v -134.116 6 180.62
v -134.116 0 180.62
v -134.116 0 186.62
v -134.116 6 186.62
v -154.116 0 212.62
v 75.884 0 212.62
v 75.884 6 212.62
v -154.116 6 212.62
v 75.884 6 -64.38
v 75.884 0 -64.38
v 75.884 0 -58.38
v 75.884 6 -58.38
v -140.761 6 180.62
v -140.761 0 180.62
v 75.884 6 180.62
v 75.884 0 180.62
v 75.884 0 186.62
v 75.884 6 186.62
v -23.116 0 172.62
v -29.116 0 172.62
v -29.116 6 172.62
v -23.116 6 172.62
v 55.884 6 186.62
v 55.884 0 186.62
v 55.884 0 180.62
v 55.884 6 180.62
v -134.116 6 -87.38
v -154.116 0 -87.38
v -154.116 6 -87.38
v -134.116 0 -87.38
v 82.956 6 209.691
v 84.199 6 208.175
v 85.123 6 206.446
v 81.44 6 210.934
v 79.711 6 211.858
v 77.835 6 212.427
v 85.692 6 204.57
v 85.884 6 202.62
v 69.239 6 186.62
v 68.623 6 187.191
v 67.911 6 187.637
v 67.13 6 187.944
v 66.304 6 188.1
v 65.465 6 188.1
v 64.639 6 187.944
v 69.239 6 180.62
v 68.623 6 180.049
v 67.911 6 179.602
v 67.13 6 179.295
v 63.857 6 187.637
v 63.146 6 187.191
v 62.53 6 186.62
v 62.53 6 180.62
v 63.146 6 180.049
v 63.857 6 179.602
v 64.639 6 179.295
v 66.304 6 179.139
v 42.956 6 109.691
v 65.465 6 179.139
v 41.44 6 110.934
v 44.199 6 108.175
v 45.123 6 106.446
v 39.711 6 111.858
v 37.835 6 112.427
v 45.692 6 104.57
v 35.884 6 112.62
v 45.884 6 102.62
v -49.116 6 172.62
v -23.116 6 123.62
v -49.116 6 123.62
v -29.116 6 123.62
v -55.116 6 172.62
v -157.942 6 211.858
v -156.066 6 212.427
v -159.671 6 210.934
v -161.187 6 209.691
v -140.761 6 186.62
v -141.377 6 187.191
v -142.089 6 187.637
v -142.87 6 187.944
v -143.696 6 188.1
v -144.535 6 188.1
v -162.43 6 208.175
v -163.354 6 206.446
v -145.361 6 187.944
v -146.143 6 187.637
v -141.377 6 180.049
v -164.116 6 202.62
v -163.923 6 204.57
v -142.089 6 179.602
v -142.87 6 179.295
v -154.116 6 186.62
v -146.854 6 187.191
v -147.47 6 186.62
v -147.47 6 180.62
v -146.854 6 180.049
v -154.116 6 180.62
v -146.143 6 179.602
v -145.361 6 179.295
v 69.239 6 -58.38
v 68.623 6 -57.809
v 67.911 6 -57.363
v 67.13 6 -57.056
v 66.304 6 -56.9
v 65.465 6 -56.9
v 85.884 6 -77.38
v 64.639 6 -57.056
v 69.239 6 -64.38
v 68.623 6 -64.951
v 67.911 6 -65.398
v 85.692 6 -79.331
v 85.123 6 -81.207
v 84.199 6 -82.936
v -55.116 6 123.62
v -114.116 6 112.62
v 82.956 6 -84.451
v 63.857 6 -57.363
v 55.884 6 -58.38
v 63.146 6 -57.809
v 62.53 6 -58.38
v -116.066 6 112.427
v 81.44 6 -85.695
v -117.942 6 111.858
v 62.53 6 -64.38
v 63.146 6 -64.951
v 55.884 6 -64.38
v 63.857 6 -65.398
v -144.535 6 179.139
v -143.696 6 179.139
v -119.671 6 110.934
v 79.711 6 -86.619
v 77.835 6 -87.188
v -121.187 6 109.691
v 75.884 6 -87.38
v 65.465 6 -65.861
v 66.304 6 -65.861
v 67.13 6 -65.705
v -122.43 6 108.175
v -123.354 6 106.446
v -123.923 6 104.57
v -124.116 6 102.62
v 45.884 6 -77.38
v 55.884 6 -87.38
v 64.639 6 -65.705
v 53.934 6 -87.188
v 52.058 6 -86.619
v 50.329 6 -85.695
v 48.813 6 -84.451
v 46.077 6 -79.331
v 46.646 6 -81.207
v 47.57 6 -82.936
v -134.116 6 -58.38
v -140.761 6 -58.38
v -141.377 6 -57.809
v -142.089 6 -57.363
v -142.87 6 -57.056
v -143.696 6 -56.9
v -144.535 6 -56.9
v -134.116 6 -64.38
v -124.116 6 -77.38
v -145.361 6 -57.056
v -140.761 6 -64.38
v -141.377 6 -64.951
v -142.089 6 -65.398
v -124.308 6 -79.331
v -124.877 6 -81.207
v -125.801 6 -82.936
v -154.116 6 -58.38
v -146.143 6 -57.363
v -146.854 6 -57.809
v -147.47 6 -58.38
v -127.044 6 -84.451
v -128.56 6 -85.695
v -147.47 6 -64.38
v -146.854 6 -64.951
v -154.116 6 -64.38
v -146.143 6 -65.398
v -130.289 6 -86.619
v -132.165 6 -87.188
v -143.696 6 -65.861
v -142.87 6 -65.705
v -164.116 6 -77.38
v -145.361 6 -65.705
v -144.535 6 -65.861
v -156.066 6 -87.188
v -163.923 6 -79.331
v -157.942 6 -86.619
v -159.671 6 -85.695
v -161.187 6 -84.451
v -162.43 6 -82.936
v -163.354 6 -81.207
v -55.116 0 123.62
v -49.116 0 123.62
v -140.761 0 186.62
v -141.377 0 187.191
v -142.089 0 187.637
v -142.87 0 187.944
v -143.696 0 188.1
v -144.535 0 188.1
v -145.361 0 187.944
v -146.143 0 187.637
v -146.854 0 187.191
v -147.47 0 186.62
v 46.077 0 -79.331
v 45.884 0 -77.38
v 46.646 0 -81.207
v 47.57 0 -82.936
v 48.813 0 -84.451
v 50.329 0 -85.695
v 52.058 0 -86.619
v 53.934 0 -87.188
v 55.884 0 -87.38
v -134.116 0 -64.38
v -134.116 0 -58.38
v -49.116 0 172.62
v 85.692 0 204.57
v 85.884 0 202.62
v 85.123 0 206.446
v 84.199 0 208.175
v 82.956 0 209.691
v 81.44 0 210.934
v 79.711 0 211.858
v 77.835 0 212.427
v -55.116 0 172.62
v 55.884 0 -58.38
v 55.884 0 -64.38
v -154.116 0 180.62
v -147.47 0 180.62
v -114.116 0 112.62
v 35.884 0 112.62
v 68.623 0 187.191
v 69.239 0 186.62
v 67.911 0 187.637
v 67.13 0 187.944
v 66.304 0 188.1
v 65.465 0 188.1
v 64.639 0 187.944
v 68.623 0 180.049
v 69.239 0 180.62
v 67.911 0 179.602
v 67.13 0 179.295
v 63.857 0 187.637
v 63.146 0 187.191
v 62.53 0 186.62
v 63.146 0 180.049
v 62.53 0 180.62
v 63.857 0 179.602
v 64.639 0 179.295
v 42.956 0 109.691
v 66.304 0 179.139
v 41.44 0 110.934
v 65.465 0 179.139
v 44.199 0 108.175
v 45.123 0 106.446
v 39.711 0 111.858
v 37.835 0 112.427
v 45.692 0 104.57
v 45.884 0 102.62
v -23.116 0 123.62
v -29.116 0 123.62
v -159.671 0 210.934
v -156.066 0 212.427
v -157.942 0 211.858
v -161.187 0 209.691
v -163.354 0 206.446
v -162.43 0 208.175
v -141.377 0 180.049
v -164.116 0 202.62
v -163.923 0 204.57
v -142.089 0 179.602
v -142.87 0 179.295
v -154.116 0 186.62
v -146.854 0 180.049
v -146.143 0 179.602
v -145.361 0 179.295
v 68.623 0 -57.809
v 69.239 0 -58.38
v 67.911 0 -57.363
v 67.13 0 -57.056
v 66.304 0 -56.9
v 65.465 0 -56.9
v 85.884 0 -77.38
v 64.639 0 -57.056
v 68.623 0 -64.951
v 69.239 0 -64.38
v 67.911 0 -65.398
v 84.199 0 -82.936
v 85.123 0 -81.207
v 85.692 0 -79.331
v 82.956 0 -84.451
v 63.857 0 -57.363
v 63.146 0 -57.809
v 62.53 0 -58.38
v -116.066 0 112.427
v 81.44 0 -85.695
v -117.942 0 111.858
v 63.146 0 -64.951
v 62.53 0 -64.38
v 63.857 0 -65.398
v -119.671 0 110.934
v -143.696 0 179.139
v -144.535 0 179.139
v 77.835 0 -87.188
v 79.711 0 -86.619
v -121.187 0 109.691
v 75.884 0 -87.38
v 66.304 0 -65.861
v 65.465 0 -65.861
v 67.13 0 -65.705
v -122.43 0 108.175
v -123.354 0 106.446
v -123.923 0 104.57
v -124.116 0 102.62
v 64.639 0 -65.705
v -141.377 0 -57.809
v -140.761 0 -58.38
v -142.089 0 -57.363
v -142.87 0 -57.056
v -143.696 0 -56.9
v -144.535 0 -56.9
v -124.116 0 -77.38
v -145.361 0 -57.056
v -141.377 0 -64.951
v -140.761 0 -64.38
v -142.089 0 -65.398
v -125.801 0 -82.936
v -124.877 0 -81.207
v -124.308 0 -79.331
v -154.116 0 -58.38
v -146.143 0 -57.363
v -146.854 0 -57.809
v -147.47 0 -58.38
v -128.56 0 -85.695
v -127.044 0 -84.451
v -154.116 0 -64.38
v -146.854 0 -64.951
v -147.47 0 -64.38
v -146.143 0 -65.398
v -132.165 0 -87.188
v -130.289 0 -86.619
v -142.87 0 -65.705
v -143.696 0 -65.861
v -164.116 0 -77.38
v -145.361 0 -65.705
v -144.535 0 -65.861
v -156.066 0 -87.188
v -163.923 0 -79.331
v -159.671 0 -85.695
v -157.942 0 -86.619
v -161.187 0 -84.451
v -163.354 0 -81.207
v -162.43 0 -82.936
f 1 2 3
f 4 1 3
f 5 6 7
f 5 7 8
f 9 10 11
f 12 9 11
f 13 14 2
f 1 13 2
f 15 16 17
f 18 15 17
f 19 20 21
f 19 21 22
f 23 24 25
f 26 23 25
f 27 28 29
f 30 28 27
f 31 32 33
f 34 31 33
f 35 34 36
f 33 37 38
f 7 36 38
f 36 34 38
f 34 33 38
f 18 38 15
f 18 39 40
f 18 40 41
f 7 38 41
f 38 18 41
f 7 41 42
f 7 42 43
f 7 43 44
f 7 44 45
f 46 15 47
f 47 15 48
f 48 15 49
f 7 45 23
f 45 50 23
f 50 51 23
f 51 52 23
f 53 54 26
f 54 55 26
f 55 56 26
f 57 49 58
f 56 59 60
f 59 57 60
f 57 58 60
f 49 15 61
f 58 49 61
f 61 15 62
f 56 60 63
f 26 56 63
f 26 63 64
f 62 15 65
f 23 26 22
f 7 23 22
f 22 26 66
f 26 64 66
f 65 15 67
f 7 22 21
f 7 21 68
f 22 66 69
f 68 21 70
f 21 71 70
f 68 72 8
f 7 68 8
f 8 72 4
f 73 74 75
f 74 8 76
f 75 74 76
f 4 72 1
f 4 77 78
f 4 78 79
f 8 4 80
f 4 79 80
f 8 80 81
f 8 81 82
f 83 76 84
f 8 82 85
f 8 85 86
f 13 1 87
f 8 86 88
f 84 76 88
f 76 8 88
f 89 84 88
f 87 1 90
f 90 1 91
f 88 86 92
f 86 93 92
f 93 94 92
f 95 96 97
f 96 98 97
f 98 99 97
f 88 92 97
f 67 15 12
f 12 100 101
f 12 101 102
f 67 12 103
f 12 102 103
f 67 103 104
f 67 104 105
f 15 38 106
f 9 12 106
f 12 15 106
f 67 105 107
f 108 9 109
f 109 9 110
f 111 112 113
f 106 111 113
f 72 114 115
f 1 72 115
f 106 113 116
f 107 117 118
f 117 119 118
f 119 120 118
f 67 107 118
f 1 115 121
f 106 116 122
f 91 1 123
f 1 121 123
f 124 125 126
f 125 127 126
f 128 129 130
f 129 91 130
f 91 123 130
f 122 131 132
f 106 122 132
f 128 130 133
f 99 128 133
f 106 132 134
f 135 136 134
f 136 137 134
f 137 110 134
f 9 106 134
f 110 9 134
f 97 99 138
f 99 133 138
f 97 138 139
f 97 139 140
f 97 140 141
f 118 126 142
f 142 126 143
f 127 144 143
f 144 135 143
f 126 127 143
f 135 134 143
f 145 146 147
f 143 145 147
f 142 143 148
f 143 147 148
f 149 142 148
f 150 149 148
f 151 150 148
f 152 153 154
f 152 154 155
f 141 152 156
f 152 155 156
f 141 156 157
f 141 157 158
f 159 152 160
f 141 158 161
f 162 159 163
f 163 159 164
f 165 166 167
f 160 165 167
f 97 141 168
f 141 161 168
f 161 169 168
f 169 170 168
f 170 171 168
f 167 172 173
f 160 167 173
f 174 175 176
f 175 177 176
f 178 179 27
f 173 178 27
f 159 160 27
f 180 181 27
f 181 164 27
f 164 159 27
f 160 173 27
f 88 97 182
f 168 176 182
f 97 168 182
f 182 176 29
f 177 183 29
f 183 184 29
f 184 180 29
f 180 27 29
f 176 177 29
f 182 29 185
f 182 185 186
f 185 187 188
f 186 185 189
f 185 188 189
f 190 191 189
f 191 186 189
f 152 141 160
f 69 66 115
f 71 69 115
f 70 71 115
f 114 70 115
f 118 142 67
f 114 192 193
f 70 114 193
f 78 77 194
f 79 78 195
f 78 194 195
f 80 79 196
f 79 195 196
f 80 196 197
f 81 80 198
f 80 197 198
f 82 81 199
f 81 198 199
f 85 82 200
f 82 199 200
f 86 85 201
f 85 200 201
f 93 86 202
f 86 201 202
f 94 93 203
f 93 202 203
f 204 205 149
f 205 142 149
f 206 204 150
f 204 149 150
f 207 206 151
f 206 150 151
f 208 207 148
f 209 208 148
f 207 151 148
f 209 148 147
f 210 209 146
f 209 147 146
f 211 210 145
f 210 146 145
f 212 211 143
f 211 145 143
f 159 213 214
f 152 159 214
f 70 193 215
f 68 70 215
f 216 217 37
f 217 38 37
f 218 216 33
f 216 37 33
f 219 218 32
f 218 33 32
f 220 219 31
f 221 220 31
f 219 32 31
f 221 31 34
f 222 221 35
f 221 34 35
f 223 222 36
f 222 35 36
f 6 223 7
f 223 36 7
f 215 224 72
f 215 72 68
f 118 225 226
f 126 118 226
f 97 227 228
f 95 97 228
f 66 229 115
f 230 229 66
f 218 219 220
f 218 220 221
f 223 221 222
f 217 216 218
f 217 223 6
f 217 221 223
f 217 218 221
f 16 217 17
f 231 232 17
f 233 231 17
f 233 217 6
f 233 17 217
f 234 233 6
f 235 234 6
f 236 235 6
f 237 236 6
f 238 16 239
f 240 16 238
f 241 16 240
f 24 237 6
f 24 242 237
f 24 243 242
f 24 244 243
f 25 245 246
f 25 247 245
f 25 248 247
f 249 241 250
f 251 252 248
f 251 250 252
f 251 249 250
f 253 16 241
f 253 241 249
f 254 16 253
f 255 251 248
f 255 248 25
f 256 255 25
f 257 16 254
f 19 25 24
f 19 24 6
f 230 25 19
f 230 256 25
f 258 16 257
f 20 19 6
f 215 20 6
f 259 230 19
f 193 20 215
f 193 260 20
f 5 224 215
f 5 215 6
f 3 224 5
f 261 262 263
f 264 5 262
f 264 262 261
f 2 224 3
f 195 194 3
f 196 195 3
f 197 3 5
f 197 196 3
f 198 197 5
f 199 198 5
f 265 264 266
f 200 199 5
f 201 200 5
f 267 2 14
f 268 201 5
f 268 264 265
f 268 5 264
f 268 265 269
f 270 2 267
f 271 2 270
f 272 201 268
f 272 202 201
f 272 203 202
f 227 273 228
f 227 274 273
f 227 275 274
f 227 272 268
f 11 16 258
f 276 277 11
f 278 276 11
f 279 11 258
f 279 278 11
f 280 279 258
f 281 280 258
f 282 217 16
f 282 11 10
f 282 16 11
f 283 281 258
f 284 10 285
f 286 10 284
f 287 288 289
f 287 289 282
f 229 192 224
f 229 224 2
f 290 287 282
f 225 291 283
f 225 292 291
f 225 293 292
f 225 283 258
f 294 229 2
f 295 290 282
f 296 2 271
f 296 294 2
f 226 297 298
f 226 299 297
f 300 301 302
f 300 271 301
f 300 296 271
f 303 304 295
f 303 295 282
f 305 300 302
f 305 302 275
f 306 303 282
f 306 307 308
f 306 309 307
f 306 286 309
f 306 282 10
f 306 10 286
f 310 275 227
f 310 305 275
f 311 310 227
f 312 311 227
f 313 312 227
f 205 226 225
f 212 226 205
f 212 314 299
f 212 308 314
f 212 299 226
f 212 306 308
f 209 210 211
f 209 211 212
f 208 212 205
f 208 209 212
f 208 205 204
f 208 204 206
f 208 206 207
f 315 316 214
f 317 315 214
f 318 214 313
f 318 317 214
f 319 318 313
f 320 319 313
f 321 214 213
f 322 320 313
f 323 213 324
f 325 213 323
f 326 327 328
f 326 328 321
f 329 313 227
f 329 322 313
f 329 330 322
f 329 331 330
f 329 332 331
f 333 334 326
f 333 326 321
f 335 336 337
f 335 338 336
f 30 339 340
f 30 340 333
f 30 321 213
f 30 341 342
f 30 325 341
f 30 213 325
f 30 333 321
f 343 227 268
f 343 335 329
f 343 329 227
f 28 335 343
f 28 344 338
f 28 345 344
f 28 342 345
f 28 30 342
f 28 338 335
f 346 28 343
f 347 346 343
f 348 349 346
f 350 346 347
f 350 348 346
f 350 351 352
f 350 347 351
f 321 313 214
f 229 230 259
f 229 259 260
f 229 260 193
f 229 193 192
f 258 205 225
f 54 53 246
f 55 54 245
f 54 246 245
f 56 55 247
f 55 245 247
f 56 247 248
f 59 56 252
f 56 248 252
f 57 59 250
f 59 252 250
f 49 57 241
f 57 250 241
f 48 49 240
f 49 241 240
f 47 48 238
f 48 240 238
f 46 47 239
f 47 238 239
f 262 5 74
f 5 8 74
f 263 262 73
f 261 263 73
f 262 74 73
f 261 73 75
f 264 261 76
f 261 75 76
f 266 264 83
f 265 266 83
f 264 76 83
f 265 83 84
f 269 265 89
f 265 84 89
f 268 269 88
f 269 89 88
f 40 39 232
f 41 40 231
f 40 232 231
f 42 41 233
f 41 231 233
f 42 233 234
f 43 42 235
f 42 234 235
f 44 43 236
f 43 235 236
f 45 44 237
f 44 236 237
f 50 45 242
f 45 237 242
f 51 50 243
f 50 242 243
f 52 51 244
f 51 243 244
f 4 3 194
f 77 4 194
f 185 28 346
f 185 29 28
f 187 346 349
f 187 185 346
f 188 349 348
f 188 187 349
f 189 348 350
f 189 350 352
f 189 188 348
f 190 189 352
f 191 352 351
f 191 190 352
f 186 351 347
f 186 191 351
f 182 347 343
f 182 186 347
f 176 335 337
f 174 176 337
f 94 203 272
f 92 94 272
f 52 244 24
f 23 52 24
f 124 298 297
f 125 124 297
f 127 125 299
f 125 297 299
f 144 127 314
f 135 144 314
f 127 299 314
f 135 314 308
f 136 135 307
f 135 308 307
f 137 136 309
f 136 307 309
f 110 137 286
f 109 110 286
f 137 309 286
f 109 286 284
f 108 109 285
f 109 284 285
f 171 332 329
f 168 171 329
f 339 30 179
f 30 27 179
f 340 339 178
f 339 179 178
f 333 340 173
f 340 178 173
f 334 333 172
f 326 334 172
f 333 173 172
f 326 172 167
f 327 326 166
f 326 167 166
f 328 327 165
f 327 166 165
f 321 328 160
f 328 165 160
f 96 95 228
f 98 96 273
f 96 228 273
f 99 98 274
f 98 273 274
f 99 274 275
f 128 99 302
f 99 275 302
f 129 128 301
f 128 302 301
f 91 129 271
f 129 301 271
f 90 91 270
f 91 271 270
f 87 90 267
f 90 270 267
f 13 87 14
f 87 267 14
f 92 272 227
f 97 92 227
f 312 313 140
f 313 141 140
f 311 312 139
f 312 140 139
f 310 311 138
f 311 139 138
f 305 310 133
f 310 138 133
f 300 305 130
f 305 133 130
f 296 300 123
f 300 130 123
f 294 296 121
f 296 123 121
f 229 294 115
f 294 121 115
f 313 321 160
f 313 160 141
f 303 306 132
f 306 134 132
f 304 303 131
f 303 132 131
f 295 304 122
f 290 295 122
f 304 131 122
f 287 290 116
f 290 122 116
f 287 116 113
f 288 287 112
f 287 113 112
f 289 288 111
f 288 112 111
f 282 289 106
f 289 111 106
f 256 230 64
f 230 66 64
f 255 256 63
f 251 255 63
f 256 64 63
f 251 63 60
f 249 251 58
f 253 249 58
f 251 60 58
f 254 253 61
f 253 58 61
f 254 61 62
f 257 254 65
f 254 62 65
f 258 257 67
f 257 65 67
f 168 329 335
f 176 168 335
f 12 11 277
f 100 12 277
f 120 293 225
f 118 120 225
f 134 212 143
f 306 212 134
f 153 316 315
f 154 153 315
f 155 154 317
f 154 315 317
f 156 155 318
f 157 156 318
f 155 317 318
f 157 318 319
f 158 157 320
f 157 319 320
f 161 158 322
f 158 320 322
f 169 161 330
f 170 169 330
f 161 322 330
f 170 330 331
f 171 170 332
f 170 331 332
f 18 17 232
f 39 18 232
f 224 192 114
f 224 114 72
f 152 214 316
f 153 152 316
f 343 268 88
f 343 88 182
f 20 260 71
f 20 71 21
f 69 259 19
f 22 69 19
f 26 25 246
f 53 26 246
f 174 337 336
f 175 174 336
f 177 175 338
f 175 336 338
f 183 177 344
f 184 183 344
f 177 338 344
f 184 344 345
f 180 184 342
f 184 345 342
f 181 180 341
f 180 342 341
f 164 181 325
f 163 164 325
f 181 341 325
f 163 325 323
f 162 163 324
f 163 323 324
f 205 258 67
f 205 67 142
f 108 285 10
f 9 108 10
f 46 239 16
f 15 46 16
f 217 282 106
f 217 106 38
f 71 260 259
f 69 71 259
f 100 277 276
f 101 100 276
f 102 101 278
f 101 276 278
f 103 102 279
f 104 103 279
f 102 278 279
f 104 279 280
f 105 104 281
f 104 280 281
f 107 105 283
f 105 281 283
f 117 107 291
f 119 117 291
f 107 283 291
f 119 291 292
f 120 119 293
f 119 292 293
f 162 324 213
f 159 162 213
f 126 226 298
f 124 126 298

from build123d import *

# Parameters (mm, degrees)
BOSS_EXTRUDE1_DEPTH  = 6
FILLET1_R            = 10
SKETCH2_OUTSIDE_W    = 330.112
SKETCH2_OUTSIDE_H    = 380.112
SKETCH2_OUTSIDE_W_2  = 6
SKETCH2_OUTSIDE_H_2  = 49
CUT_EXTRUDE1_DEPTH   = 7
CUT_EXTRUDE2_DEPTH   = 7
LPATTERN1_COUNT      = 2
LPATTERN1_PITCH      = 245
LPATTERN1_COUNT_DIR2 = 2
LPATTERN1_PITCH_DIR2 = 210


with BuildPart() as part:
    # Sketch1 → Boss-Extrude1 (new body)
    with BuildSketch(Plane(origin=(0, 0, 0), x_dir=(1, 0, 0), z_dir=(0, 1, 0))):
        Polygon((-164.115526796, 87.380429132), (-124.115526796, 87.380429132), (-124.115526796, -112.619570868), (45.884473204, -112.619570868), (45.884473204, 87.380429132), (85.884473204, 87.380429132), (85.884473204, -212.619570868), (-164.115526796, -212.619570868), align=None)
    extrude(amount=BOSS_EXTRUDE1_DEPTH)

    # Fillet1
    fillet1_edges = [part.edges().sort_by_distance(p)[0] for p in [
        (-164.115526796, 3, -87.380429132),
        (-124.115526796, 3, -87.380429132),
        (-124.115526796, 3, 112.619570868),
        (45.884473204, 3, 112.619570868),
        (45.884473204, 3, -87.380429132),
        (85.884473204, 3, -87.380429132),
        (85.884473204, 3, 212.619570868),
        (-164.115526796, 3, 212.619570868),
    ]]
    fillet(fillet1_edges, radius=FILLET1_R)

    # Sketch2 outside → Cut-Extrude1 (cut, through all)
    with BuildSketch(Plane.XZ):
        with Locations((-39.116, 62.62)):
            Rectangle(SKETCH2_OUTSIDE_W, SKETCH2_OUTSIDE_H)
        with BuildLine():
            Line((-164.115526796, 202.619570868), (-164.115526796, -77.380429132))
            ThreePointArc((-164.115526796, -77.380429132), (-161.186594608, -84.451496944), (-154.115526796, -87.380429132))
            Line((-154.115526796, -87.380429132), (-134.115526796, -87.380429132))
            ThreePointArc((-134.115526796, -87.380429132), (-127.044458984, -84.451496944), (-124.115526796, -77.380429132))
            Line((-124.115526796, -77.380429132), (-124.115526796, 102.619570868))
            ThreePointArc((-124.115526796, 102.619570868), (-121.186594608, 109.69063868), (-114.115526796, 112.619570868))
            Line((-114.115526796, 112.619570868), (35.884473204, 112.619570868))
            ThreePointArc((35.884473204, 112.619570868), (42.955541016, 109.69063868), (45.884473204, 102.619570868))
            Line((45.884473204, 102.619570868), (45.884473204, -77.380429132))
            ThreePointArc((45.884473204, -77.380429132), (48.813405392, -84.451496944), (55.884473204, -87.380429132))
            Line((55.884473204, -87.380429132), (75.884473204, -87.380429132))
            ThreePointArc((75.884473204, -87.380429132), (82.955541016, -84.451496944), (85.884473204, -77.380429132))
            Line((85.884473204, -77.380429132), (85.884473204, 202.619570868))
            ThreePointArc((85.884473204, 202.619570868), (82.955541016, 209.69063868), (75.884473204, 212.619570868))
            Line((75.884473204, 212.619570868), (-154.115526796, 212.619570868))
            ThreePointArc((-154.115526796, 212.619570868), (-161.186594608, 209.69063868), (-164.115526796, 202.619570868))
        make_face(mode=Mode.SUBTRACT)
        with Locations((-52.115526796, 148.119570868)):
            Rectangle(SKETCH2_OUTSIDE_W_2, SKETCH2_OUTSIDE_H_2)
        with Locations((-26.115526796, 148.119570868)):
            Rectangle(SKETCH2_OUTSIDE_W_2, SKETCH2_OUTSIDE_H_2)
    extrude(amount=-CUT_EXTRUDE1_DEPTH, mode=Mode.SUBTRACT)

    # Sketch5 → Cut-Extrude2 (cut, through all)
    with BuildSketch(Plane(origin=(0, 0, 0), x_dir=(-1, 0, 0), z_dir=(0, -1, 0))):
        with BuildLine():
            Line((134.115526796, 58.380429132), (140.76142483, 58.380429132))
            ThreePointArc((140.76142483, 58.380429132), (144.115526796, 56.880429132), (147.469628762, 58.380429132))
            Line((147.469628762, 58.380429132), (154.115526796, 58.380429132))
            Line((154.115526796, 58.380429132), (154.115526796, 64.380429132))
            Line((154.115526796, 64.380429132), (147.469628762, 64.380429132))
            ThreePointArc((147.469628762, 64.380429132), (144.115526796, 65.880429132), (140.76142483, 64.380429132))
            Line((140.76142483, 64.380429132), (134.115526796, 64.380429132))
            Line((134.115526796, 64.380429132), (134.115526796, 58.380429132))
        make_face()
    cut_extrude2 = extrude(amount=-CUT_EXTRUDE2_DEPTH, mode=Mode.SUBTRACT)

    # LPattern1: Cut-Extrude2 2 × 2
    with Locations(*[(j * LPATTERN1_PITCH_DIR2, 0, i * LPATTERN1_PITCH) for i in range(LPATTERN1_COUNT) for j in range(LPATTERN1_COUNT_DIR2) if (i, j) != (0, 0)]):
        add(cut_extrude2, mode=Mode.SUBTRACT)


solid = part.part
